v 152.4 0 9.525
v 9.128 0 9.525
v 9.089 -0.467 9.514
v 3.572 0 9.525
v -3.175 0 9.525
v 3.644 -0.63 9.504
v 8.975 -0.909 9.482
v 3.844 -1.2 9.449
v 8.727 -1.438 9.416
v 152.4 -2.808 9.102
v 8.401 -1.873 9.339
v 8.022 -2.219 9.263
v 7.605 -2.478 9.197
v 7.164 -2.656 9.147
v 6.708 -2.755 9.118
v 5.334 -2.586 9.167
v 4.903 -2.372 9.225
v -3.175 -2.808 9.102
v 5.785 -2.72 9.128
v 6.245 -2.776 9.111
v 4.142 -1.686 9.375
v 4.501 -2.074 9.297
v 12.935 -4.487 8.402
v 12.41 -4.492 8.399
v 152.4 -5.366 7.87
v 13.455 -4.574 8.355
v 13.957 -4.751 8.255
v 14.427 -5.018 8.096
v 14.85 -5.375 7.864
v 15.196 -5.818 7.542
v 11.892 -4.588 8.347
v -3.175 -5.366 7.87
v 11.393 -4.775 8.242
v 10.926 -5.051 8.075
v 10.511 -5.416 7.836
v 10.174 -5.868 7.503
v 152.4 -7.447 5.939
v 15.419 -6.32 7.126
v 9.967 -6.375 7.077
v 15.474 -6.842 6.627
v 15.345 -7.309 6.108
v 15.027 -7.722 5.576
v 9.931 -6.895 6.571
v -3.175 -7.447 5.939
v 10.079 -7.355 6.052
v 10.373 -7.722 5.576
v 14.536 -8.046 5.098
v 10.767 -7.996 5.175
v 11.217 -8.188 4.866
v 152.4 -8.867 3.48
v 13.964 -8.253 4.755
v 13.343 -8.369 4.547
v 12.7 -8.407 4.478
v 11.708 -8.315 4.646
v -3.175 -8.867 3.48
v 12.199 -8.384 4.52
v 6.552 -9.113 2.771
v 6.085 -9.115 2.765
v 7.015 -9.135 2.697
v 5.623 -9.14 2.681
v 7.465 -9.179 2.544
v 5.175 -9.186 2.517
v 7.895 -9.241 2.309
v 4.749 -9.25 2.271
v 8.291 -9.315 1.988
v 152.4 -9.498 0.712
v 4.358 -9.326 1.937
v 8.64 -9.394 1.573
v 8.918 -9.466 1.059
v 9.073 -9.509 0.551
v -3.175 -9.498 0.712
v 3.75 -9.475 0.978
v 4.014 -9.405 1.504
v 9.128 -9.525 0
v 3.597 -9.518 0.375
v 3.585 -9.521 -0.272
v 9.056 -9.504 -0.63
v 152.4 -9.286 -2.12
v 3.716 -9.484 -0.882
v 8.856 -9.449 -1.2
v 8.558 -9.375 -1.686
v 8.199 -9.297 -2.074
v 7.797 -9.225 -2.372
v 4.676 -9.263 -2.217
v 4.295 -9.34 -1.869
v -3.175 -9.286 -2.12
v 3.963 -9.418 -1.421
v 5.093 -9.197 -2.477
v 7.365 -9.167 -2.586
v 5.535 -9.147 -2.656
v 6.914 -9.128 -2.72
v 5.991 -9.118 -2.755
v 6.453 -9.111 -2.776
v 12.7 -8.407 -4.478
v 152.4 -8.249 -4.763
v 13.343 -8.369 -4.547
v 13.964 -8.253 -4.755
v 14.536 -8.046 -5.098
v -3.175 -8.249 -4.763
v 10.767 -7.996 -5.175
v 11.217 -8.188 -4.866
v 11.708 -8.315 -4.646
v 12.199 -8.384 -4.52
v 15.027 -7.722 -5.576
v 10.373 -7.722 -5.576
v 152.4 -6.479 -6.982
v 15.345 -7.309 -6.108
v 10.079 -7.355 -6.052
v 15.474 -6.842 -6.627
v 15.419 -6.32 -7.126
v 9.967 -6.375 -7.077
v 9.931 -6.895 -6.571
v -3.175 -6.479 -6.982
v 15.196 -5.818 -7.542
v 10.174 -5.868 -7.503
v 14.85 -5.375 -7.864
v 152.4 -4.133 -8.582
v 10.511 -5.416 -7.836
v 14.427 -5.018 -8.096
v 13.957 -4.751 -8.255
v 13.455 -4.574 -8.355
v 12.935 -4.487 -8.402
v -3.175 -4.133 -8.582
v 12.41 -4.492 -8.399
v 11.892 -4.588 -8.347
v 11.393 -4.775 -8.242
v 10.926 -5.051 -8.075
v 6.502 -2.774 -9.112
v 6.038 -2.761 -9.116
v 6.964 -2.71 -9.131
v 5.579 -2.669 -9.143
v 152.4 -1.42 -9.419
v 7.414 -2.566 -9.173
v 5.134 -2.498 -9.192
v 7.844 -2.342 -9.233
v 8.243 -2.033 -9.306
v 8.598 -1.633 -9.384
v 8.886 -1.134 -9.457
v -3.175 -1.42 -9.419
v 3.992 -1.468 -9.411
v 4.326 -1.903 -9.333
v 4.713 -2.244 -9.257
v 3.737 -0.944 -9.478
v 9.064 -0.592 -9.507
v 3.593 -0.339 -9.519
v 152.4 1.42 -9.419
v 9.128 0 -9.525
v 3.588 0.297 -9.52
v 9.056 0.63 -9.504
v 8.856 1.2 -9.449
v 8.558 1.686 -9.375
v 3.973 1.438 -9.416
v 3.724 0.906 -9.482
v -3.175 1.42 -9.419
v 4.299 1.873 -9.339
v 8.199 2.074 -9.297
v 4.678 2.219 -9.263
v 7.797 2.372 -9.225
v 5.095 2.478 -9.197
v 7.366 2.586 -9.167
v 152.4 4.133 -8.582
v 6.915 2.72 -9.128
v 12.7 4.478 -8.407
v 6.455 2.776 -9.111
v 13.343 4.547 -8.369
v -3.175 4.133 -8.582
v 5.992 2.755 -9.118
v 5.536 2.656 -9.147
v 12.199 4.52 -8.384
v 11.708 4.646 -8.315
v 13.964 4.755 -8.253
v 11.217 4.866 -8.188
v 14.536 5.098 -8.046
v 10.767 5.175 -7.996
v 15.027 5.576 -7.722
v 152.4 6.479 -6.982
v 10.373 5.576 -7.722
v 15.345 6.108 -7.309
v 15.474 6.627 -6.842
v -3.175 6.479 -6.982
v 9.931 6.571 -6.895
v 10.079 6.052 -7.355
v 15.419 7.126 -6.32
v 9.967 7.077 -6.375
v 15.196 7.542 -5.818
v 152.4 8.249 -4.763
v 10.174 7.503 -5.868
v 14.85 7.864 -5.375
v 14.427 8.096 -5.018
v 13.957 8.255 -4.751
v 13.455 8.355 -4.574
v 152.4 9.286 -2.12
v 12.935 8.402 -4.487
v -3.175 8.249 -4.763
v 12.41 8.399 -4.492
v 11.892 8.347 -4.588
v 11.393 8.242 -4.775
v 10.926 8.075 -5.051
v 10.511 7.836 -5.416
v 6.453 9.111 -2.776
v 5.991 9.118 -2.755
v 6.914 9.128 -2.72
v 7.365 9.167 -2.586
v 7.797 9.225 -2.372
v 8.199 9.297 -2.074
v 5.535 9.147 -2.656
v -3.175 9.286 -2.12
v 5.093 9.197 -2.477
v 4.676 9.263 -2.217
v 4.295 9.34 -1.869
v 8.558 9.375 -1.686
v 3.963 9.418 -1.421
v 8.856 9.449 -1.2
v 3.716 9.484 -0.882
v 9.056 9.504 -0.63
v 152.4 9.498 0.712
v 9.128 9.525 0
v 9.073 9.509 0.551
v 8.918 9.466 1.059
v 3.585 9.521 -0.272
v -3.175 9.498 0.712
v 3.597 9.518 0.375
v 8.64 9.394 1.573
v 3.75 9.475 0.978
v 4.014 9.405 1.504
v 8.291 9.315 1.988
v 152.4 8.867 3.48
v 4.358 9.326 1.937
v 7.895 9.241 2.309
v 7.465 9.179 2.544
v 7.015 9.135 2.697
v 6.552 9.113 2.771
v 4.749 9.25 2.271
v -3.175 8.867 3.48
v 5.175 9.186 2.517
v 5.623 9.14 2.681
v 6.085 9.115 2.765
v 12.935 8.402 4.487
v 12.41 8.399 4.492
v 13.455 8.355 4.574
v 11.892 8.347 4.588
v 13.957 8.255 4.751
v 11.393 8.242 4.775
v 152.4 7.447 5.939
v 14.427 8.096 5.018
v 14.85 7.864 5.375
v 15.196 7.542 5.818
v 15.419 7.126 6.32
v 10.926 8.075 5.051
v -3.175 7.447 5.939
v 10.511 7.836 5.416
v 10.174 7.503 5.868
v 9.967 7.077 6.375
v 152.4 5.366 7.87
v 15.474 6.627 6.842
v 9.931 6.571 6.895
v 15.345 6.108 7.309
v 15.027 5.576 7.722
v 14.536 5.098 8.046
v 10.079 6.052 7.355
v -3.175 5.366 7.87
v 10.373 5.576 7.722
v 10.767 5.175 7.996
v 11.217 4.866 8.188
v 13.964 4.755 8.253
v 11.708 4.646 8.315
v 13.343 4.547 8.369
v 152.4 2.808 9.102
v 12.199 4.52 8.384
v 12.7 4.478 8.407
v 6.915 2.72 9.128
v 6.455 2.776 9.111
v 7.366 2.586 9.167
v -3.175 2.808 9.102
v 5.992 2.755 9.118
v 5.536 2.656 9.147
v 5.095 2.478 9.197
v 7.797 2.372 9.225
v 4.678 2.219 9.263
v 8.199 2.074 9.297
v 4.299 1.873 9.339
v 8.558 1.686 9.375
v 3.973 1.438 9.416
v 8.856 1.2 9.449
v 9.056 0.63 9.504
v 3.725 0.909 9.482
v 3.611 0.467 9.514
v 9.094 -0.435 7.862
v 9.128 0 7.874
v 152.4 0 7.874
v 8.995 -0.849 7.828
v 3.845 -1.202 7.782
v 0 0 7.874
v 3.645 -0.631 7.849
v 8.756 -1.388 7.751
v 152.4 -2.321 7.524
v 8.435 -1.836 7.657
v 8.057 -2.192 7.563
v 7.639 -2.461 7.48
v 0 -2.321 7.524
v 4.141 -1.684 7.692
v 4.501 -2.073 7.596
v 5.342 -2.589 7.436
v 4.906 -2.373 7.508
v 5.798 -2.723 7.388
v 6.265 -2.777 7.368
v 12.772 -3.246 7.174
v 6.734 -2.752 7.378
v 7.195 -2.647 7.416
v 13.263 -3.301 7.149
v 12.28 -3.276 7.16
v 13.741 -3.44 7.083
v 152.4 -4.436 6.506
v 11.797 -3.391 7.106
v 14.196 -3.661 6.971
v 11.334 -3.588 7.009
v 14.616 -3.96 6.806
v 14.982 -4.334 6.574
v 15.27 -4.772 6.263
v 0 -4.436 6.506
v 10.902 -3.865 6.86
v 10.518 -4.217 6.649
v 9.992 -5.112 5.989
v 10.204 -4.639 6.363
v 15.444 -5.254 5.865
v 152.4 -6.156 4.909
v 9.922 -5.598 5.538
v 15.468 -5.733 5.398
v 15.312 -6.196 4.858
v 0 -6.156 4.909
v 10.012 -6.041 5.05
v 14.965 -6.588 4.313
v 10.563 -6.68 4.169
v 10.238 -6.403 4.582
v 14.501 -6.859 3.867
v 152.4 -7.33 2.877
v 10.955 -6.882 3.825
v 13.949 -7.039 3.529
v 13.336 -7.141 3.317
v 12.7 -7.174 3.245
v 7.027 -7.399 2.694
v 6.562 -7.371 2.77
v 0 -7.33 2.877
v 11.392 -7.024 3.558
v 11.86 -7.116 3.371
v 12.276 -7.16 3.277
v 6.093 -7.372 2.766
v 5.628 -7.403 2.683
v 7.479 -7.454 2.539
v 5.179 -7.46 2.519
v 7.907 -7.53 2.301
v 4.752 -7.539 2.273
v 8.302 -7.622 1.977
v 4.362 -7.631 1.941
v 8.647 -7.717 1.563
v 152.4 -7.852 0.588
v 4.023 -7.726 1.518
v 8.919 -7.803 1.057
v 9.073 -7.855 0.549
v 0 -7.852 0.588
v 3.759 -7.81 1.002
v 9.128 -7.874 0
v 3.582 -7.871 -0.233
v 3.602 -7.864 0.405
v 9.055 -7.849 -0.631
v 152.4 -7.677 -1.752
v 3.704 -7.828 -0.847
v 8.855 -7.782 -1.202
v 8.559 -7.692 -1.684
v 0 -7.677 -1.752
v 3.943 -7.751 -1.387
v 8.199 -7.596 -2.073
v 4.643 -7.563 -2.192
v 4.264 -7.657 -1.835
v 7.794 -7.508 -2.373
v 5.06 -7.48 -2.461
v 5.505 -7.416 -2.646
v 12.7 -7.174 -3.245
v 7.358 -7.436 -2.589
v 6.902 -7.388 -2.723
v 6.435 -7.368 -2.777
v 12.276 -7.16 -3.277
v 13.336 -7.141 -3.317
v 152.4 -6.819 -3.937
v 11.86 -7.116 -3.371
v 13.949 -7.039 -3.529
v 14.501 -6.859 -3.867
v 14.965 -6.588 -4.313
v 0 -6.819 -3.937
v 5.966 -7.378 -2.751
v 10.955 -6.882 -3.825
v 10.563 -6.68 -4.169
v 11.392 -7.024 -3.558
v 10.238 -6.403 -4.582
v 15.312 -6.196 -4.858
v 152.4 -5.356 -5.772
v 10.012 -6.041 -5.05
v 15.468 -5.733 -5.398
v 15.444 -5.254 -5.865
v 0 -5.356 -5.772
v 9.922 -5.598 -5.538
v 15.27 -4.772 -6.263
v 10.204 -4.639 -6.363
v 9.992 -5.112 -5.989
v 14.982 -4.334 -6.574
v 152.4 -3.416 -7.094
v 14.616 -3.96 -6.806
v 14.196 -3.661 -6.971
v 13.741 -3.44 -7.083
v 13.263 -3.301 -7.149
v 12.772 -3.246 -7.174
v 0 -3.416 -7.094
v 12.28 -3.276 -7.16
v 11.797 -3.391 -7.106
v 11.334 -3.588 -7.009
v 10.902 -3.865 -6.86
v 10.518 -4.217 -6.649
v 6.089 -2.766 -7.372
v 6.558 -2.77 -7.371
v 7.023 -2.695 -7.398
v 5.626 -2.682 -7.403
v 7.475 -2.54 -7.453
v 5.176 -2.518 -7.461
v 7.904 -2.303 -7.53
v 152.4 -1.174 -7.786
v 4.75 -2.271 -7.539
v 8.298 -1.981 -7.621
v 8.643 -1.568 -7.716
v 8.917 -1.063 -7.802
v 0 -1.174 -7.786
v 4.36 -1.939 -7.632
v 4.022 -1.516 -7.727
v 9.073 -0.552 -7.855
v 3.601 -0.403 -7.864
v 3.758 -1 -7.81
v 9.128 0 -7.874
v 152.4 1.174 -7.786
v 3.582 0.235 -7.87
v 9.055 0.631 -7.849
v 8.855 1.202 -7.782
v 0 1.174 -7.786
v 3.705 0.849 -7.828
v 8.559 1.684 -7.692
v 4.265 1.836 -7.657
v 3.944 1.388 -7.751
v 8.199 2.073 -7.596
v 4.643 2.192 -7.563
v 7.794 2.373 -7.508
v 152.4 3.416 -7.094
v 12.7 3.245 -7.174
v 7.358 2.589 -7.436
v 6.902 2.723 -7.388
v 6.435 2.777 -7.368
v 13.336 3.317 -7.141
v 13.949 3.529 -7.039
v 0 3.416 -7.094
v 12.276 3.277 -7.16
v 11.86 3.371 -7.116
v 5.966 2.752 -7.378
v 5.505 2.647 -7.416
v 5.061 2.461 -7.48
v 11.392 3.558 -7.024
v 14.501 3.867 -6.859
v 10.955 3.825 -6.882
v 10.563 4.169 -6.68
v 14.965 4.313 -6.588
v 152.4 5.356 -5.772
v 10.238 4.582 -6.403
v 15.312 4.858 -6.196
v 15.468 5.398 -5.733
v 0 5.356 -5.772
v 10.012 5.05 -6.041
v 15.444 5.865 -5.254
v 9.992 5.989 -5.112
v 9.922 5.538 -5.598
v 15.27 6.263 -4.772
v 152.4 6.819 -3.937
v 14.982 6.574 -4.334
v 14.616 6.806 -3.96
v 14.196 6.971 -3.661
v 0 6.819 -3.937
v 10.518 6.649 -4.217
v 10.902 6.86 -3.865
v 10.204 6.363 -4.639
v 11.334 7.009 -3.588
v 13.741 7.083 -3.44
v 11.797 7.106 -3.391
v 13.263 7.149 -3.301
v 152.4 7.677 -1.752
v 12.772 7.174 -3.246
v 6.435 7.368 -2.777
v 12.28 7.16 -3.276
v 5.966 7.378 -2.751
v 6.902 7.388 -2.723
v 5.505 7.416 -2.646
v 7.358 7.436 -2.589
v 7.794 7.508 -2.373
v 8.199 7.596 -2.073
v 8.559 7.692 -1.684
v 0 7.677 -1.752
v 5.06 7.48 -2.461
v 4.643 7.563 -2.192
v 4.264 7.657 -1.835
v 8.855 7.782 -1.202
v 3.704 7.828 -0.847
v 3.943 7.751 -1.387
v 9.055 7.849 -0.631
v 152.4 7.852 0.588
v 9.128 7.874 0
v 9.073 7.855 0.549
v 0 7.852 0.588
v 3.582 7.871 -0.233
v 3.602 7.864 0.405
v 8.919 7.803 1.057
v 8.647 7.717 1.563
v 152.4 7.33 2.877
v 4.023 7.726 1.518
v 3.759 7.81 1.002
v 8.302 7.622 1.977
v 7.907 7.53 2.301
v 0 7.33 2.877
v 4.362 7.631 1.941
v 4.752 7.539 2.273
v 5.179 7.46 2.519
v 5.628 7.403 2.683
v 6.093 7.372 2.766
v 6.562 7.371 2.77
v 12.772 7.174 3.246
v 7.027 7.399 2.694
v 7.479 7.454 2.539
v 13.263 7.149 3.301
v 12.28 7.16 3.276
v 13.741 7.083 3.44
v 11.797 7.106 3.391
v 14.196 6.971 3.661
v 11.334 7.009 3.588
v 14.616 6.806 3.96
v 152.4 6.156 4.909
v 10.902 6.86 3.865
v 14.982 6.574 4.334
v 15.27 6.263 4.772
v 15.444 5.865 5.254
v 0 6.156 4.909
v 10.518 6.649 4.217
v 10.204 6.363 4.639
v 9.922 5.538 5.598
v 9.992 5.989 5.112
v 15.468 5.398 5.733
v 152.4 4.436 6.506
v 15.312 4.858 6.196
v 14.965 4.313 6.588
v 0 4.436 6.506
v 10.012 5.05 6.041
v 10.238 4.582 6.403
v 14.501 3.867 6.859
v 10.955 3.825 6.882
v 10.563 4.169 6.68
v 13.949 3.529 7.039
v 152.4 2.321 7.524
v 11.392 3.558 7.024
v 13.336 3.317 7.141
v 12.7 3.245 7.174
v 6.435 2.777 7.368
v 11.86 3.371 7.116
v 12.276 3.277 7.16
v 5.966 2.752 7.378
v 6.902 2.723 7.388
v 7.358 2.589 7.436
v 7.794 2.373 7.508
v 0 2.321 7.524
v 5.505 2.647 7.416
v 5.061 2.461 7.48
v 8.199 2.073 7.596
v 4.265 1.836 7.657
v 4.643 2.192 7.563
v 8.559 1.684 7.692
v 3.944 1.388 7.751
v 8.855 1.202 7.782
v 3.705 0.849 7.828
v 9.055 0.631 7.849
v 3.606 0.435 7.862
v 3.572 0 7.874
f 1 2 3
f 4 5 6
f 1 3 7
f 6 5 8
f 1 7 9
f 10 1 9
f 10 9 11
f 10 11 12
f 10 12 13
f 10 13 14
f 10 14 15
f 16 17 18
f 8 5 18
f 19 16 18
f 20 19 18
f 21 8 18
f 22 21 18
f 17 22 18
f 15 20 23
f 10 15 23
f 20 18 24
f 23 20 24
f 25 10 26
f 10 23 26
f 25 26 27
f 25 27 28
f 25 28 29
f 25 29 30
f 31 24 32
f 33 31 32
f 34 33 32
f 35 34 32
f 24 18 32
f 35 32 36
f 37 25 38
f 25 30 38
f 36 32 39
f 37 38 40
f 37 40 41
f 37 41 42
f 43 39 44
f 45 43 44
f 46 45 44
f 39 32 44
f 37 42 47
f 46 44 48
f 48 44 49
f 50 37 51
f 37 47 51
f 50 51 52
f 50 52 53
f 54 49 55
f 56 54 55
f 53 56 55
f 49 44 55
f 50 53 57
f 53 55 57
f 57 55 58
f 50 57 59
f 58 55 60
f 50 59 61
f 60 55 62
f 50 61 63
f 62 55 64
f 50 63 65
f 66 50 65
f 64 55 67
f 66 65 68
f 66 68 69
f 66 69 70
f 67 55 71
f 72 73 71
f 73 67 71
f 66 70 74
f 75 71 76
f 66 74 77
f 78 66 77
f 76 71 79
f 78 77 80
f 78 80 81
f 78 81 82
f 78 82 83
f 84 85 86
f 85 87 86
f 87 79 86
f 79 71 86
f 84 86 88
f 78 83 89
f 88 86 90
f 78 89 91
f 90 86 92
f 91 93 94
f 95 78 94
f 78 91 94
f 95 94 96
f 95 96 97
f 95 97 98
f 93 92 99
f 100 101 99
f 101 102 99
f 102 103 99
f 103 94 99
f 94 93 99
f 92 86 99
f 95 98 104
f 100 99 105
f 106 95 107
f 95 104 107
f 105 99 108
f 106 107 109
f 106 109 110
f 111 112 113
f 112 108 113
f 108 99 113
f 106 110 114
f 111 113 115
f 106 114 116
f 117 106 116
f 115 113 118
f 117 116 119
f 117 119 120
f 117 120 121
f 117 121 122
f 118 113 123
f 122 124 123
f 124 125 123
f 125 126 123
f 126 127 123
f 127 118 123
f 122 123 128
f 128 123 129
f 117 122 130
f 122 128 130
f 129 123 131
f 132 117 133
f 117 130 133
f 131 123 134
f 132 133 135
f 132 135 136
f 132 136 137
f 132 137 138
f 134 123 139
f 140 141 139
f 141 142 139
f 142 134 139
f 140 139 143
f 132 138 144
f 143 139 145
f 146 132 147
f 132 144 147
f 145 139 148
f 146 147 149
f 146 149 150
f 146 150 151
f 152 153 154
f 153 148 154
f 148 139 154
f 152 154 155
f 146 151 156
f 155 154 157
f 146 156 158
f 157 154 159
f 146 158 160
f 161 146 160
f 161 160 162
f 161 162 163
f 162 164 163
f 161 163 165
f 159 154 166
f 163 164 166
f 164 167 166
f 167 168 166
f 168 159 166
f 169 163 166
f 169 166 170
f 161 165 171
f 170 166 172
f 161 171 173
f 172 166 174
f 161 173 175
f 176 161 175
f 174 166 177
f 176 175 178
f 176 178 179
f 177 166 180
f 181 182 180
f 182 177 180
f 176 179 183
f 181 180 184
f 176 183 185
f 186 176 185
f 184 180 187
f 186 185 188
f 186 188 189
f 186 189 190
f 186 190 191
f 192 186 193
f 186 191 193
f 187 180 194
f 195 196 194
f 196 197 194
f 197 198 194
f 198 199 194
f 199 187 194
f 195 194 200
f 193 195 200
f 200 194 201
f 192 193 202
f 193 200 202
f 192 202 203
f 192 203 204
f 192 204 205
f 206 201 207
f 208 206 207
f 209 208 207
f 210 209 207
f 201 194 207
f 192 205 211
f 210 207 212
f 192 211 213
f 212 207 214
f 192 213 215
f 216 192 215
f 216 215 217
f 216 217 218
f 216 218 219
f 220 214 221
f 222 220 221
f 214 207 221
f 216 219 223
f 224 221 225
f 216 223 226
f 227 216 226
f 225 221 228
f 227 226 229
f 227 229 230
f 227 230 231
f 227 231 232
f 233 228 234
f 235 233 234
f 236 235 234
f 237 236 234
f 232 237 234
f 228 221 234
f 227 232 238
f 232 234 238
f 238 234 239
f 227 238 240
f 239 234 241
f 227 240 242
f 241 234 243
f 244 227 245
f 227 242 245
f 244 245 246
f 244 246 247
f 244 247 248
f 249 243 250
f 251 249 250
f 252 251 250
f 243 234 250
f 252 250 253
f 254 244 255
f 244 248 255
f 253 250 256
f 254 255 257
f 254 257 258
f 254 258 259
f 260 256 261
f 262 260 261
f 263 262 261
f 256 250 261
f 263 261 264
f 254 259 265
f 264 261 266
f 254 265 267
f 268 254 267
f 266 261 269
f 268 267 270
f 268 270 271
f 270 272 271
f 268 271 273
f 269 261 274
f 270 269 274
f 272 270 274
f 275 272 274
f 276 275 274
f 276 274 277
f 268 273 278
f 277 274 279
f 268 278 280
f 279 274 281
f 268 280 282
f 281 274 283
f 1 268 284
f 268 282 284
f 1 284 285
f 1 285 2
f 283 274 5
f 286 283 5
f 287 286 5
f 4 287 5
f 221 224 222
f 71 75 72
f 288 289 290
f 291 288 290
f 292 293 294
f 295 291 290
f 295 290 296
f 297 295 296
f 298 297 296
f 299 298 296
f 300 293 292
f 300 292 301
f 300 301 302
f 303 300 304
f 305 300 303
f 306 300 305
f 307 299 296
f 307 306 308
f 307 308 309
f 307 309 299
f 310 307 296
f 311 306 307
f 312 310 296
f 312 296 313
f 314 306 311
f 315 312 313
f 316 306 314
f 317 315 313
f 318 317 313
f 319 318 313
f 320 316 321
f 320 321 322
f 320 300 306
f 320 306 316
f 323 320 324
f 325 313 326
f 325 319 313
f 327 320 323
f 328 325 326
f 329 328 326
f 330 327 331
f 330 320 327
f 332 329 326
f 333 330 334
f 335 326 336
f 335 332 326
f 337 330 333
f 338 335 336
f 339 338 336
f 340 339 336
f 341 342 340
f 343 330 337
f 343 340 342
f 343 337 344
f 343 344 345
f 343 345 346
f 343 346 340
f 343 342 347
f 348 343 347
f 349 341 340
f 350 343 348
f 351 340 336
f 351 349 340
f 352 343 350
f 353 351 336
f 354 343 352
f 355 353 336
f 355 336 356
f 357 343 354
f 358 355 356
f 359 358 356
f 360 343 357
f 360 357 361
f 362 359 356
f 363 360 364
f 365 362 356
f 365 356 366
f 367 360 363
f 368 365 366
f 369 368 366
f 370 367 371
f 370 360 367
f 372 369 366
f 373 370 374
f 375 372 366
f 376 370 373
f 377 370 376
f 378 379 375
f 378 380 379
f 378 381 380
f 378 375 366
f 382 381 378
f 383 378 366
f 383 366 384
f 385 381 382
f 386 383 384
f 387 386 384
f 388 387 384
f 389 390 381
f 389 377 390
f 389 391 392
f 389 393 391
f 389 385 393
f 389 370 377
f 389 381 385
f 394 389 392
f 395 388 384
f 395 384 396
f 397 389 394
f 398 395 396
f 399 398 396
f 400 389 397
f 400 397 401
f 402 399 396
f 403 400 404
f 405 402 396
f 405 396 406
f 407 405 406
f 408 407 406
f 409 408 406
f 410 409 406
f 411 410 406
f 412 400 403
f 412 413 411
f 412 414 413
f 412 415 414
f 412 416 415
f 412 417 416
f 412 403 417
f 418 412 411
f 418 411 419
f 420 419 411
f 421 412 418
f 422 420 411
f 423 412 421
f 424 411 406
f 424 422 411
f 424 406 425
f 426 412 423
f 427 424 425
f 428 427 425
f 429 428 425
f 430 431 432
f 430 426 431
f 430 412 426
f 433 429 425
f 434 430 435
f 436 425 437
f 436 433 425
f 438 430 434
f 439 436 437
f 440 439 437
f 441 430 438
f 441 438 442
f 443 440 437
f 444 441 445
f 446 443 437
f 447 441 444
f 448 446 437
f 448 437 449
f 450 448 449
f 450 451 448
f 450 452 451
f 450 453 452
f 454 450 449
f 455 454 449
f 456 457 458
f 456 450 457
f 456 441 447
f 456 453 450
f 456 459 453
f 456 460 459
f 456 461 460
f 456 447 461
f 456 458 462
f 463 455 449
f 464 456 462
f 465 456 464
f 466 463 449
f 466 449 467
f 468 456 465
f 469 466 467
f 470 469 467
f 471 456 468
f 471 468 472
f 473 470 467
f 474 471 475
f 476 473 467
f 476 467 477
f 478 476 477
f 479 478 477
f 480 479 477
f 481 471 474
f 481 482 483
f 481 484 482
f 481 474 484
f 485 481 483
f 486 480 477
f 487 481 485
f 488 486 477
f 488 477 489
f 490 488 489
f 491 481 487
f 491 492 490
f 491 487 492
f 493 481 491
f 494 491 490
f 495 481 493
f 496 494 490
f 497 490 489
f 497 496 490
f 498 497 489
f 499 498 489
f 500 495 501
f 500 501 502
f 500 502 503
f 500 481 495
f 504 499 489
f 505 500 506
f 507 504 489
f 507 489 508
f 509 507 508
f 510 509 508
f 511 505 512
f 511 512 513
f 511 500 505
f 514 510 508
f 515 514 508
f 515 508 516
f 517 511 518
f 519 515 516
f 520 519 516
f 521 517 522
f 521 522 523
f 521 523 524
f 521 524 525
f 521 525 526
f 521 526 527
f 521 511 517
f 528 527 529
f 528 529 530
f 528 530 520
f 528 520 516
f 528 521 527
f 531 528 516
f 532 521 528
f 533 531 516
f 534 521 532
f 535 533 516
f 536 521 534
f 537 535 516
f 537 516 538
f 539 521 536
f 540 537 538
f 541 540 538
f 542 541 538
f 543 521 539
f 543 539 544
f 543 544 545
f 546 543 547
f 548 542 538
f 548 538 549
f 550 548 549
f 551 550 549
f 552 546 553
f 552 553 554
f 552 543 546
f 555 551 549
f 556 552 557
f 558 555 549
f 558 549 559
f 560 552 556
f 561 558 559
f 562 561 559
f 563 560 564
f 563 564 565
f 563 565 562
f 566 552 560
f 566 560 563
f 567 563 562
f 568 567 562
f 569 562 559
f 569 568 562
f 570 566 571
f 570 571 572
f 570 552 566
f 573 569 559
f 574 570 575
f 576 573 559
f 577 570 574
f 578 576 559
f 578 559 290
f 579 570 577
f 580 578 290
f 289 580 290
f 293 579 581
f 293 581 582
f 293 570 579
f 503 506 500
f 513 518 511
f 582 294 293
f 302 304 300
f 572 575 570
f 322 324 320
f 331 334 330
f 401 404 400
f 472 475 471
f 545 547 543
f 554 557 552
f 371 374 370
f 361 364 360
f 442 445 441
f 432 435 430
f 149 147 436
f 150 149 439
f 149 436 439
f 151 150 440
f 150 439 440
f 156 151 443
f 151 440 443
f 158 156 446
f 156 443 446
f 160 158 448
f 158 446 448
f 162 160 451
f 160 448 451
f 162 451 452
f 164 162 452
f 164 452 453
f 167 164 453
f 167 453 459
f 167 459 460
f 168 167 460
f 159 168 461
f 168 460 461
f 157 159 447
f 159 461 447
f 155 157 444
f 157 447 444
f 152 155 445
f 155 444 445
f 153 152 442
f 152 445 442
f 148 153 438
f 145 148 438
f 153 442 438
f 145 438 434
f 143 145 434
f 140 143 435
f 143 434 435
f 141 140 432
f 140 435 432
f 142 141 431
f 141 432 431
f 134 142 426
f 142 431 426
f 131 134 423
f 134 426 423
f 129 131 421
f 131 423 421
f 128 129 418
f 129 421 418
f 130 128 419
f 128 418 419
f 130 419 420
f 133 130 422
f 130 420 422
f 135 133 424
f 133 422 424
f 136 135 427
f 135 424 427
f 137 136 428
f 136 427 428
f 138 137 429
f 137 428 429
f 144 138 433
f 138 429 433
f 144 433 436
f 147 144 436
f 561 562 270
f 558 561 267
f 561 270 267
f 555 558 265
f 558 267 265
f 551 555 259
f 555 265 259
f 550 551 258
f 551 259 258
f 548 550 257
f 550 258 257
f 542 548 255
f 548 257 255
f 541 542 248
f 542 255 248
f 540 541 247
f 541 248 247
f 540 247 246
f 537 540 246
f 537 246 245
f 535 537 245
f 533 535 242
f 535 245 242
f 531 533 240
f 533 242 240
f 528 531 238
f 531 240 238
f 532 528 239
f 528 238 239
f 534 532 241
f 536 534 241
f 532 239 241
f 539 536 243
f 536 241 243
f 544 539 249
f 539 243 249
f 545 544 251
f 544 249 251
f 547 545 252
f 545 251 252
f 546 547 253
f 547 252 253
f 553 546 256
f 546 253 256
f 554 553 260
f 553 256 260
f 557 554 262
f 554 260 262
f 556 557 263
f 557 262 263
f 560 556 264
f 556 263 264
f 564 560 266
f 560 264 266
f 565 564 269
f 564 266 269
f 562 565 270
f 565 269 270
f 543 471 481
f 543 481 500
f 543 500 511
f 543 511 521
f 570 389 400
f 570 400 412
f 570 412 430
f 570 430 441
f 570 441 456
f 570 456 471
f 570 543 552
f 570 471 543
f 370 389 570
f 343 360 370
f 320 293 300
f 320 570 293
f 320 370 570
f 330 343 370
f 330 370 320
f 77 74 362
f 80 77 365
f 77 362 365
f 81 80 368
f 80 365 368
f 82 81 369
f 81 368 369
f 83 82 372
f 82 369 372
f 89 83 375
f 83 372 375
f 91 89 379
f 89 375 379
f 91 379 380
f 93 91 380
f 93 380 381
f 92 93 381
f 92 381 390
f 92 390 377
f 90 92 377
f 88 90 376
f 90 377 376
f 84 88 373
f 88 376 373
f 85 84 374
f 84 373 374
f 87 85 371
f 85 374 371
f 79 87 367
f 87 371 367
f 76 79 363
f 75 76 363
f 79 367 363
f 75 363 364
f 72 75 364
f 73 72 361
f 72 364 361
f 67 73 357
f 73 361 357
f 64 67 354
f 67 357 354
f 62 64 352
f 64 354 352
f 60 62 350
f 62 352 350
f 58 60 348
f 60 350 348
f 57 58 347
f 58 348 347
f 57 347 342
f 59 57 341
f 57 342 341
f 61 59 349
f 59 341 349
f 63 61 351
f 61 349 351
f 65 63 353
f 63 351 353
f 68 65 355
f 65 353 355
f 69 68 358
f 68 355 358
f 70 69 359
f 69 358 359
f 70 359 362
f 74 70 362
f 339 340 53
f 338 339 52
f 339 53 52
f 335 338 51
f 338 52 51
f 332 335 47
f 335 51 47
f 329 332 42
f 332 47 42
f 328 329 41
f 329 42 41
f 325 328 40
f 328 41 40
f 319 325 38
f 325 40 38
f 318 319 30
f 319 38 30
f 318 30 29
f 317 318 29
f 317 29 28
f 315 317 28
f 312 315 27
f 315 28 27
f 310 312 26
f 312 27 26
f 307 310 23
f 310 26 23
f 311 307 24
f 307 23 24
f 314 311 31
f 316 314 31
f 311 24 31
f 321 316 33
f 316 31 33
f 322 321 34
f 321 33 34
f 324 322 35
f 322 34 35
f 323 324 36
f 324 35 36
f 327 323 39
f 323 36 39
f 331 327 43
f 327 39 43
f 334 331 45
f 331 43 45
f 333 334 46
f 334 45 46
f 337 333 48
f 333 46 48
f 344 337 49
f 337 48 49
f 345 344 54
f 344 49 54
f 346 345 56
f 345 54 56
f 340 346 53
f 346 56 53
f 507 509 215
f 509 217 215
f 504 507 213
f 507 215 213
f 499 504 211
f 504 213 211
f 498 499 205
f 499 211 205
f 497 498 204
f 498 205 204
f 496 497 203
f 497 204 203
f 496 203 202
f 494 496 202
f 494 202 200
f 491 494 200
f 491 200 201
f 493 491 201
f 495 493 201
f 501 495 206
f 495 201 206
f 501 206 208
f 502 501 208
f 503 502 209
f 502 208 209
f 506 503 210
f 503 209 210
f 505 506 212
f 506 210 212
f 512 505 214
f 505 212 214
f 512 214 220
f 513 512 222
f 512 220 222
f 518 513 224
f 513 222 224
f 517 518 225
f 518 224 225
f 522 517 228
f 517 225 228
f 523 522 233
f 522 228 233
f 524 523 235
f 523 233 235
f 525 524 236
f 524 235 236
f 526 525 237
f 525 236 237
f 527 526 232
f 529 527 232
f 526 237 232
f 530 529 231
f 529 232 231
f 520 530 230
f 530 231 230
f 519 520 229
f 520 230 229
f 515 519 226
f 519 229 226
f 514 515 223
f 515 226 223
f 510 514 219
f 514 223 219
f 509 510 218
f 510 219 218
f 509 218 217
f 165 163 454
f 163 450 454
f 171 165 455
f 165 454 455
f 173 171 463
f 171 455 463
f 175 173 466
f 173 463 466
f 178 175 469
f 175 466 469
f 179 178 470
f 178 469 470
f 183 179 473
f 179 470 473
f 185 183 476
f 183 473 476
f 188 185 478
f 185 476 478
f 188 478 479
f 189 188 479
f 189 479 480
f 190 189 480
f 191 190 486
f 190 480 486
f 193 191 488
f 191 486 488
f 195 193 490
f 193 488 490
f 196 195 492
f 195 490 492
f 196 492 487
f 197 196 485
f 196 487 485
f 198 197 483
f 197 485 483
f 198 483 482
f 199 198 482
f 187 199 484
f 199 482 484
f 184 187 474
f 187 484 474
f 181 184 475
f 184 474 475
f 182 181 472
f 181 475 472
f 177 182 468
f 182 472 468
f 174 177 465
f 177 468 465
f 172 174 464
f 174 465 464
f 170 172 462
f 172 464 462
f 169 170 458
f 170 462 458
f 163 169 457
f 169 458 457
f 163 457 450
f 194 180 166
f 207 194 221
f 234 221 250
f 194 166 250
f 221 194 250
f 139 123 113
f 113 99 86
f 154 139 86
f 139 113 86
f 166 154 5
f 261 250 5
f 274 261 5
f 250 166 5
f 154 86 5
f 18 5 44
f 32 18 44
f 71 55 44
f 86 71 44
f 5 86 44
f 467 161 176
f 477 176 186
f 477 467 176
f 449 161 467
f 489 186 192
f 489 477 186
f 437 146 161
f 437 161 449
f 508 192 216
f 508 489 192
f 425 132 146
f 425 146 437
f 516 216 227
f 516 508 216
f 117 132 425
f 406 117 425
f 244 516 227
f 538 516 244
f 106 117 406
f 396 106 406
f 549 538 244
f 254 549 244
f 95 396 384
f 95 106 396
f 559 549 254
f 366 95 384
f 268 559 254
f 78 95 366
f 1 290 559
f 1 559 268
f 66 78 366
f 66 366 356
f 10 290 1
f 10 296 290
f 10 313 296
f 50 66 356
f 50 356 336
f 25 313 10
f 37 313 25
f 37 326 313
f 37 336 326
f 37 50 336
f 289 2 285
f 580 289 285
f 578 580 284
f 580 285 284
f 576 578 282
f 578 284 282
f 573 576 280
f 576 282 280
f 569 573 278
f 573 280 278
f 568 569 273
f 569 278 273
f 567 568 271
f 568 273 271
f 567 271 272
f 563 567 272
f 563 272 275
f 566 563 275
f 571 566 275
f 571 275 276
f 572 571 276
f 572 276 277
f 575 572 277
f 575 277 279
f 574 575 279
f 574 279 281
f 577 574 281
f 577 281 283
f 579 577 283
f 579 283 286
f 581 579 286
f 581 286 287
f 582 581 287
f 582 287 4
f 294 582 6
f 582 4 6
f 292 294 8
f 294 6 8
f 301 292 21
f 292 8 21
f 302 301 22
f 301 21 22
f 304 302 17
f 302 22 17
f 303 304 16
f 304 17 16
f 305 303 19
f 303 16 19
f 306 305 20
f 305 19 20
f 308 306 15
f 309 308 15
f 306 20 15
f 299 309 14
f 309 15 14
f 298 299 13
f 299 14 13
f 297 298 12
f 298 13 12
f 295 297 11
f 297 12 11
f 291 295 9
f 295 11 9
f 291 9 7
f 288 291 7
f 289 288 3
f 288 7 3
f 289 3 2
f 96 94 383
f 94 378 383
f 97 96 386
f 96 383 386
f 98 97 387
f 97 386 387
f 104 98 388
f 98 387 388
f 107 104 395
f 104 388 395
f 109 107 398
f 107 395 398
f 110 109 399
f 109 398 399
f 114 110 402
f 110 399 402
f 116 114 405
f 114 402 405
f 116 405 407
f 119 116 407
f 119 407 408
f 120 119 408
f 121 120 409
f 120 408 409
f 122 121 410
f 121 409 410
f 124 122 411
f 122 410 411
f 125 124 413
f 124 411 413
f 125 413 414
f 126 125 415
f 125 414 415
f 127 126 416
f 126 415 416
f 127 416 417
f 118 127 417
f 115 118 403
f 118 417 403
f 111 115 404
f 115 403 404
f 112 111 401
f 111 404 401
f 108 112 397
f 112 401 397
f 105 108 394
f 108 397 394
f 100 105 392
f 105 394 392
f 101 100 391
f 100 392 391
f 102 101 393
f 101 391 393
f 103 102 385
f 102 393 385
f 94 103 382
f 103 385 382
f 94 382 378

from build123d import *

# Parameters (mm, degrees)
SKETCH1_R           = 9.525
SKETCH1_R_2         = 7.874
BOSS_EXTRUDE1_DEPTH = 152.4
BOSS_EXTRUDE2_START = -3.175
SKETCH2_R           = 9.525
BOSS_EXTRUDE2_DEPTH = 3.175
SKETCH3_R           = 2.778125
CUT_EXTRUDE1_DEPTH  = 12.7
CIRPATTERN1_COUNT   = 2
CIRPATTERN1_ANGLE   = 90
SKETCH4_R           = 2.778125
CUT_EXTRUDE2_DEPTH  = 12.7
CIRPATTERN2_COUNT   = 2
CIRPATTERN2_ANGLE   = 90


with BuildPart() as part:
    # Sketch1 → Boss-Extrude1 (new body)
    with BuildSketch(Plane(origin=(0, 0, 0), x_dir=(0, 0, -1), z_dir=(1, 0, 0))):
        with Locations(Location((0, 0, 0), (0, 0, 180))):
            Circle(SKETCH1_R)
        with Locations(Location((0, 0, 0), (0, 0, 180))):
            Circle(SKETCH1_R_2, mode=Mode.SUBTRACT)
    extrude(amount=BOSS_EXTRUDE1_DEPTH)

    # Sketch2 → Boss-Extrude2 (add)
    with BuildSketch(Plane(origin=(0, 0, 0), x_dir=(0, 0, -1), z_dir=(1, 0, 0)).offset(BOSS_EXTRUDE2_START)):
        with Locations(Location((0, 0, 0), (0, 0, 180))):
            Circle(SKETCH2_R)
    extrude(amount=BOSS_EXTRUDE2_DEPTH)

    # Sketch3 → Cut-Extrude1 (cut, symmetric)
    with BuildSketch(Plane.XY):
        with Locations((6.35, 0)):
            Circle(SKETCH3_R)
    cut_extrude1 = extrude(amount=CUT_EXTRUDE1_DEPTH, both=True, mode=Mode.SUBTRACT)

    # CirPattern1: Cut-Extrude1 ×2 about axis
    cirpattern1_axis = Axis((152.4, 0, 0), (-1, 0, 0))
    for i in range(1, CIRPATTERN1_COUNT):
        add(cut_extrude1.rotate(cirpattern1_axis, i * CIRPATTERN1_ANGLE / (CIRPATTERN1_COUNT - 1)), mode=Mode.SUBTRACT)

    # Sketch4 → Cut-Extrude2 (cut, symmetric)
    with BuildSketch(Plane(origin=(0, 0, 0), x_dir=(1, 0, 0), z_dir=(0, -0.7071067811865488, 0.7071067811865464))):
        with Locations(Location((12.7, 0, 0), (0, 0, 270))):
            Circle(SKETCH4_R)
    cut_extrude2 = extrude(amount=CUT_EXTRUDE2_DEPTH, both=True, mode=Mode.SUBTRACT)

    # CirPattern2: Cut-Extrude2 ×2 about axis
    cirpattern2_axis = Axis((152.4, 0, 0), (-1, 0, 0))
    for i in range(1, CIRPATTERN2_COUNT):
        add(cut_extrude2.rotate(cirpattern2_axis, i * CIRPATTERN2_ANGLE / (CIRPATTERN2_COUNT - 1)), mode=Mode.SUBTRACT)


solid = part.part
